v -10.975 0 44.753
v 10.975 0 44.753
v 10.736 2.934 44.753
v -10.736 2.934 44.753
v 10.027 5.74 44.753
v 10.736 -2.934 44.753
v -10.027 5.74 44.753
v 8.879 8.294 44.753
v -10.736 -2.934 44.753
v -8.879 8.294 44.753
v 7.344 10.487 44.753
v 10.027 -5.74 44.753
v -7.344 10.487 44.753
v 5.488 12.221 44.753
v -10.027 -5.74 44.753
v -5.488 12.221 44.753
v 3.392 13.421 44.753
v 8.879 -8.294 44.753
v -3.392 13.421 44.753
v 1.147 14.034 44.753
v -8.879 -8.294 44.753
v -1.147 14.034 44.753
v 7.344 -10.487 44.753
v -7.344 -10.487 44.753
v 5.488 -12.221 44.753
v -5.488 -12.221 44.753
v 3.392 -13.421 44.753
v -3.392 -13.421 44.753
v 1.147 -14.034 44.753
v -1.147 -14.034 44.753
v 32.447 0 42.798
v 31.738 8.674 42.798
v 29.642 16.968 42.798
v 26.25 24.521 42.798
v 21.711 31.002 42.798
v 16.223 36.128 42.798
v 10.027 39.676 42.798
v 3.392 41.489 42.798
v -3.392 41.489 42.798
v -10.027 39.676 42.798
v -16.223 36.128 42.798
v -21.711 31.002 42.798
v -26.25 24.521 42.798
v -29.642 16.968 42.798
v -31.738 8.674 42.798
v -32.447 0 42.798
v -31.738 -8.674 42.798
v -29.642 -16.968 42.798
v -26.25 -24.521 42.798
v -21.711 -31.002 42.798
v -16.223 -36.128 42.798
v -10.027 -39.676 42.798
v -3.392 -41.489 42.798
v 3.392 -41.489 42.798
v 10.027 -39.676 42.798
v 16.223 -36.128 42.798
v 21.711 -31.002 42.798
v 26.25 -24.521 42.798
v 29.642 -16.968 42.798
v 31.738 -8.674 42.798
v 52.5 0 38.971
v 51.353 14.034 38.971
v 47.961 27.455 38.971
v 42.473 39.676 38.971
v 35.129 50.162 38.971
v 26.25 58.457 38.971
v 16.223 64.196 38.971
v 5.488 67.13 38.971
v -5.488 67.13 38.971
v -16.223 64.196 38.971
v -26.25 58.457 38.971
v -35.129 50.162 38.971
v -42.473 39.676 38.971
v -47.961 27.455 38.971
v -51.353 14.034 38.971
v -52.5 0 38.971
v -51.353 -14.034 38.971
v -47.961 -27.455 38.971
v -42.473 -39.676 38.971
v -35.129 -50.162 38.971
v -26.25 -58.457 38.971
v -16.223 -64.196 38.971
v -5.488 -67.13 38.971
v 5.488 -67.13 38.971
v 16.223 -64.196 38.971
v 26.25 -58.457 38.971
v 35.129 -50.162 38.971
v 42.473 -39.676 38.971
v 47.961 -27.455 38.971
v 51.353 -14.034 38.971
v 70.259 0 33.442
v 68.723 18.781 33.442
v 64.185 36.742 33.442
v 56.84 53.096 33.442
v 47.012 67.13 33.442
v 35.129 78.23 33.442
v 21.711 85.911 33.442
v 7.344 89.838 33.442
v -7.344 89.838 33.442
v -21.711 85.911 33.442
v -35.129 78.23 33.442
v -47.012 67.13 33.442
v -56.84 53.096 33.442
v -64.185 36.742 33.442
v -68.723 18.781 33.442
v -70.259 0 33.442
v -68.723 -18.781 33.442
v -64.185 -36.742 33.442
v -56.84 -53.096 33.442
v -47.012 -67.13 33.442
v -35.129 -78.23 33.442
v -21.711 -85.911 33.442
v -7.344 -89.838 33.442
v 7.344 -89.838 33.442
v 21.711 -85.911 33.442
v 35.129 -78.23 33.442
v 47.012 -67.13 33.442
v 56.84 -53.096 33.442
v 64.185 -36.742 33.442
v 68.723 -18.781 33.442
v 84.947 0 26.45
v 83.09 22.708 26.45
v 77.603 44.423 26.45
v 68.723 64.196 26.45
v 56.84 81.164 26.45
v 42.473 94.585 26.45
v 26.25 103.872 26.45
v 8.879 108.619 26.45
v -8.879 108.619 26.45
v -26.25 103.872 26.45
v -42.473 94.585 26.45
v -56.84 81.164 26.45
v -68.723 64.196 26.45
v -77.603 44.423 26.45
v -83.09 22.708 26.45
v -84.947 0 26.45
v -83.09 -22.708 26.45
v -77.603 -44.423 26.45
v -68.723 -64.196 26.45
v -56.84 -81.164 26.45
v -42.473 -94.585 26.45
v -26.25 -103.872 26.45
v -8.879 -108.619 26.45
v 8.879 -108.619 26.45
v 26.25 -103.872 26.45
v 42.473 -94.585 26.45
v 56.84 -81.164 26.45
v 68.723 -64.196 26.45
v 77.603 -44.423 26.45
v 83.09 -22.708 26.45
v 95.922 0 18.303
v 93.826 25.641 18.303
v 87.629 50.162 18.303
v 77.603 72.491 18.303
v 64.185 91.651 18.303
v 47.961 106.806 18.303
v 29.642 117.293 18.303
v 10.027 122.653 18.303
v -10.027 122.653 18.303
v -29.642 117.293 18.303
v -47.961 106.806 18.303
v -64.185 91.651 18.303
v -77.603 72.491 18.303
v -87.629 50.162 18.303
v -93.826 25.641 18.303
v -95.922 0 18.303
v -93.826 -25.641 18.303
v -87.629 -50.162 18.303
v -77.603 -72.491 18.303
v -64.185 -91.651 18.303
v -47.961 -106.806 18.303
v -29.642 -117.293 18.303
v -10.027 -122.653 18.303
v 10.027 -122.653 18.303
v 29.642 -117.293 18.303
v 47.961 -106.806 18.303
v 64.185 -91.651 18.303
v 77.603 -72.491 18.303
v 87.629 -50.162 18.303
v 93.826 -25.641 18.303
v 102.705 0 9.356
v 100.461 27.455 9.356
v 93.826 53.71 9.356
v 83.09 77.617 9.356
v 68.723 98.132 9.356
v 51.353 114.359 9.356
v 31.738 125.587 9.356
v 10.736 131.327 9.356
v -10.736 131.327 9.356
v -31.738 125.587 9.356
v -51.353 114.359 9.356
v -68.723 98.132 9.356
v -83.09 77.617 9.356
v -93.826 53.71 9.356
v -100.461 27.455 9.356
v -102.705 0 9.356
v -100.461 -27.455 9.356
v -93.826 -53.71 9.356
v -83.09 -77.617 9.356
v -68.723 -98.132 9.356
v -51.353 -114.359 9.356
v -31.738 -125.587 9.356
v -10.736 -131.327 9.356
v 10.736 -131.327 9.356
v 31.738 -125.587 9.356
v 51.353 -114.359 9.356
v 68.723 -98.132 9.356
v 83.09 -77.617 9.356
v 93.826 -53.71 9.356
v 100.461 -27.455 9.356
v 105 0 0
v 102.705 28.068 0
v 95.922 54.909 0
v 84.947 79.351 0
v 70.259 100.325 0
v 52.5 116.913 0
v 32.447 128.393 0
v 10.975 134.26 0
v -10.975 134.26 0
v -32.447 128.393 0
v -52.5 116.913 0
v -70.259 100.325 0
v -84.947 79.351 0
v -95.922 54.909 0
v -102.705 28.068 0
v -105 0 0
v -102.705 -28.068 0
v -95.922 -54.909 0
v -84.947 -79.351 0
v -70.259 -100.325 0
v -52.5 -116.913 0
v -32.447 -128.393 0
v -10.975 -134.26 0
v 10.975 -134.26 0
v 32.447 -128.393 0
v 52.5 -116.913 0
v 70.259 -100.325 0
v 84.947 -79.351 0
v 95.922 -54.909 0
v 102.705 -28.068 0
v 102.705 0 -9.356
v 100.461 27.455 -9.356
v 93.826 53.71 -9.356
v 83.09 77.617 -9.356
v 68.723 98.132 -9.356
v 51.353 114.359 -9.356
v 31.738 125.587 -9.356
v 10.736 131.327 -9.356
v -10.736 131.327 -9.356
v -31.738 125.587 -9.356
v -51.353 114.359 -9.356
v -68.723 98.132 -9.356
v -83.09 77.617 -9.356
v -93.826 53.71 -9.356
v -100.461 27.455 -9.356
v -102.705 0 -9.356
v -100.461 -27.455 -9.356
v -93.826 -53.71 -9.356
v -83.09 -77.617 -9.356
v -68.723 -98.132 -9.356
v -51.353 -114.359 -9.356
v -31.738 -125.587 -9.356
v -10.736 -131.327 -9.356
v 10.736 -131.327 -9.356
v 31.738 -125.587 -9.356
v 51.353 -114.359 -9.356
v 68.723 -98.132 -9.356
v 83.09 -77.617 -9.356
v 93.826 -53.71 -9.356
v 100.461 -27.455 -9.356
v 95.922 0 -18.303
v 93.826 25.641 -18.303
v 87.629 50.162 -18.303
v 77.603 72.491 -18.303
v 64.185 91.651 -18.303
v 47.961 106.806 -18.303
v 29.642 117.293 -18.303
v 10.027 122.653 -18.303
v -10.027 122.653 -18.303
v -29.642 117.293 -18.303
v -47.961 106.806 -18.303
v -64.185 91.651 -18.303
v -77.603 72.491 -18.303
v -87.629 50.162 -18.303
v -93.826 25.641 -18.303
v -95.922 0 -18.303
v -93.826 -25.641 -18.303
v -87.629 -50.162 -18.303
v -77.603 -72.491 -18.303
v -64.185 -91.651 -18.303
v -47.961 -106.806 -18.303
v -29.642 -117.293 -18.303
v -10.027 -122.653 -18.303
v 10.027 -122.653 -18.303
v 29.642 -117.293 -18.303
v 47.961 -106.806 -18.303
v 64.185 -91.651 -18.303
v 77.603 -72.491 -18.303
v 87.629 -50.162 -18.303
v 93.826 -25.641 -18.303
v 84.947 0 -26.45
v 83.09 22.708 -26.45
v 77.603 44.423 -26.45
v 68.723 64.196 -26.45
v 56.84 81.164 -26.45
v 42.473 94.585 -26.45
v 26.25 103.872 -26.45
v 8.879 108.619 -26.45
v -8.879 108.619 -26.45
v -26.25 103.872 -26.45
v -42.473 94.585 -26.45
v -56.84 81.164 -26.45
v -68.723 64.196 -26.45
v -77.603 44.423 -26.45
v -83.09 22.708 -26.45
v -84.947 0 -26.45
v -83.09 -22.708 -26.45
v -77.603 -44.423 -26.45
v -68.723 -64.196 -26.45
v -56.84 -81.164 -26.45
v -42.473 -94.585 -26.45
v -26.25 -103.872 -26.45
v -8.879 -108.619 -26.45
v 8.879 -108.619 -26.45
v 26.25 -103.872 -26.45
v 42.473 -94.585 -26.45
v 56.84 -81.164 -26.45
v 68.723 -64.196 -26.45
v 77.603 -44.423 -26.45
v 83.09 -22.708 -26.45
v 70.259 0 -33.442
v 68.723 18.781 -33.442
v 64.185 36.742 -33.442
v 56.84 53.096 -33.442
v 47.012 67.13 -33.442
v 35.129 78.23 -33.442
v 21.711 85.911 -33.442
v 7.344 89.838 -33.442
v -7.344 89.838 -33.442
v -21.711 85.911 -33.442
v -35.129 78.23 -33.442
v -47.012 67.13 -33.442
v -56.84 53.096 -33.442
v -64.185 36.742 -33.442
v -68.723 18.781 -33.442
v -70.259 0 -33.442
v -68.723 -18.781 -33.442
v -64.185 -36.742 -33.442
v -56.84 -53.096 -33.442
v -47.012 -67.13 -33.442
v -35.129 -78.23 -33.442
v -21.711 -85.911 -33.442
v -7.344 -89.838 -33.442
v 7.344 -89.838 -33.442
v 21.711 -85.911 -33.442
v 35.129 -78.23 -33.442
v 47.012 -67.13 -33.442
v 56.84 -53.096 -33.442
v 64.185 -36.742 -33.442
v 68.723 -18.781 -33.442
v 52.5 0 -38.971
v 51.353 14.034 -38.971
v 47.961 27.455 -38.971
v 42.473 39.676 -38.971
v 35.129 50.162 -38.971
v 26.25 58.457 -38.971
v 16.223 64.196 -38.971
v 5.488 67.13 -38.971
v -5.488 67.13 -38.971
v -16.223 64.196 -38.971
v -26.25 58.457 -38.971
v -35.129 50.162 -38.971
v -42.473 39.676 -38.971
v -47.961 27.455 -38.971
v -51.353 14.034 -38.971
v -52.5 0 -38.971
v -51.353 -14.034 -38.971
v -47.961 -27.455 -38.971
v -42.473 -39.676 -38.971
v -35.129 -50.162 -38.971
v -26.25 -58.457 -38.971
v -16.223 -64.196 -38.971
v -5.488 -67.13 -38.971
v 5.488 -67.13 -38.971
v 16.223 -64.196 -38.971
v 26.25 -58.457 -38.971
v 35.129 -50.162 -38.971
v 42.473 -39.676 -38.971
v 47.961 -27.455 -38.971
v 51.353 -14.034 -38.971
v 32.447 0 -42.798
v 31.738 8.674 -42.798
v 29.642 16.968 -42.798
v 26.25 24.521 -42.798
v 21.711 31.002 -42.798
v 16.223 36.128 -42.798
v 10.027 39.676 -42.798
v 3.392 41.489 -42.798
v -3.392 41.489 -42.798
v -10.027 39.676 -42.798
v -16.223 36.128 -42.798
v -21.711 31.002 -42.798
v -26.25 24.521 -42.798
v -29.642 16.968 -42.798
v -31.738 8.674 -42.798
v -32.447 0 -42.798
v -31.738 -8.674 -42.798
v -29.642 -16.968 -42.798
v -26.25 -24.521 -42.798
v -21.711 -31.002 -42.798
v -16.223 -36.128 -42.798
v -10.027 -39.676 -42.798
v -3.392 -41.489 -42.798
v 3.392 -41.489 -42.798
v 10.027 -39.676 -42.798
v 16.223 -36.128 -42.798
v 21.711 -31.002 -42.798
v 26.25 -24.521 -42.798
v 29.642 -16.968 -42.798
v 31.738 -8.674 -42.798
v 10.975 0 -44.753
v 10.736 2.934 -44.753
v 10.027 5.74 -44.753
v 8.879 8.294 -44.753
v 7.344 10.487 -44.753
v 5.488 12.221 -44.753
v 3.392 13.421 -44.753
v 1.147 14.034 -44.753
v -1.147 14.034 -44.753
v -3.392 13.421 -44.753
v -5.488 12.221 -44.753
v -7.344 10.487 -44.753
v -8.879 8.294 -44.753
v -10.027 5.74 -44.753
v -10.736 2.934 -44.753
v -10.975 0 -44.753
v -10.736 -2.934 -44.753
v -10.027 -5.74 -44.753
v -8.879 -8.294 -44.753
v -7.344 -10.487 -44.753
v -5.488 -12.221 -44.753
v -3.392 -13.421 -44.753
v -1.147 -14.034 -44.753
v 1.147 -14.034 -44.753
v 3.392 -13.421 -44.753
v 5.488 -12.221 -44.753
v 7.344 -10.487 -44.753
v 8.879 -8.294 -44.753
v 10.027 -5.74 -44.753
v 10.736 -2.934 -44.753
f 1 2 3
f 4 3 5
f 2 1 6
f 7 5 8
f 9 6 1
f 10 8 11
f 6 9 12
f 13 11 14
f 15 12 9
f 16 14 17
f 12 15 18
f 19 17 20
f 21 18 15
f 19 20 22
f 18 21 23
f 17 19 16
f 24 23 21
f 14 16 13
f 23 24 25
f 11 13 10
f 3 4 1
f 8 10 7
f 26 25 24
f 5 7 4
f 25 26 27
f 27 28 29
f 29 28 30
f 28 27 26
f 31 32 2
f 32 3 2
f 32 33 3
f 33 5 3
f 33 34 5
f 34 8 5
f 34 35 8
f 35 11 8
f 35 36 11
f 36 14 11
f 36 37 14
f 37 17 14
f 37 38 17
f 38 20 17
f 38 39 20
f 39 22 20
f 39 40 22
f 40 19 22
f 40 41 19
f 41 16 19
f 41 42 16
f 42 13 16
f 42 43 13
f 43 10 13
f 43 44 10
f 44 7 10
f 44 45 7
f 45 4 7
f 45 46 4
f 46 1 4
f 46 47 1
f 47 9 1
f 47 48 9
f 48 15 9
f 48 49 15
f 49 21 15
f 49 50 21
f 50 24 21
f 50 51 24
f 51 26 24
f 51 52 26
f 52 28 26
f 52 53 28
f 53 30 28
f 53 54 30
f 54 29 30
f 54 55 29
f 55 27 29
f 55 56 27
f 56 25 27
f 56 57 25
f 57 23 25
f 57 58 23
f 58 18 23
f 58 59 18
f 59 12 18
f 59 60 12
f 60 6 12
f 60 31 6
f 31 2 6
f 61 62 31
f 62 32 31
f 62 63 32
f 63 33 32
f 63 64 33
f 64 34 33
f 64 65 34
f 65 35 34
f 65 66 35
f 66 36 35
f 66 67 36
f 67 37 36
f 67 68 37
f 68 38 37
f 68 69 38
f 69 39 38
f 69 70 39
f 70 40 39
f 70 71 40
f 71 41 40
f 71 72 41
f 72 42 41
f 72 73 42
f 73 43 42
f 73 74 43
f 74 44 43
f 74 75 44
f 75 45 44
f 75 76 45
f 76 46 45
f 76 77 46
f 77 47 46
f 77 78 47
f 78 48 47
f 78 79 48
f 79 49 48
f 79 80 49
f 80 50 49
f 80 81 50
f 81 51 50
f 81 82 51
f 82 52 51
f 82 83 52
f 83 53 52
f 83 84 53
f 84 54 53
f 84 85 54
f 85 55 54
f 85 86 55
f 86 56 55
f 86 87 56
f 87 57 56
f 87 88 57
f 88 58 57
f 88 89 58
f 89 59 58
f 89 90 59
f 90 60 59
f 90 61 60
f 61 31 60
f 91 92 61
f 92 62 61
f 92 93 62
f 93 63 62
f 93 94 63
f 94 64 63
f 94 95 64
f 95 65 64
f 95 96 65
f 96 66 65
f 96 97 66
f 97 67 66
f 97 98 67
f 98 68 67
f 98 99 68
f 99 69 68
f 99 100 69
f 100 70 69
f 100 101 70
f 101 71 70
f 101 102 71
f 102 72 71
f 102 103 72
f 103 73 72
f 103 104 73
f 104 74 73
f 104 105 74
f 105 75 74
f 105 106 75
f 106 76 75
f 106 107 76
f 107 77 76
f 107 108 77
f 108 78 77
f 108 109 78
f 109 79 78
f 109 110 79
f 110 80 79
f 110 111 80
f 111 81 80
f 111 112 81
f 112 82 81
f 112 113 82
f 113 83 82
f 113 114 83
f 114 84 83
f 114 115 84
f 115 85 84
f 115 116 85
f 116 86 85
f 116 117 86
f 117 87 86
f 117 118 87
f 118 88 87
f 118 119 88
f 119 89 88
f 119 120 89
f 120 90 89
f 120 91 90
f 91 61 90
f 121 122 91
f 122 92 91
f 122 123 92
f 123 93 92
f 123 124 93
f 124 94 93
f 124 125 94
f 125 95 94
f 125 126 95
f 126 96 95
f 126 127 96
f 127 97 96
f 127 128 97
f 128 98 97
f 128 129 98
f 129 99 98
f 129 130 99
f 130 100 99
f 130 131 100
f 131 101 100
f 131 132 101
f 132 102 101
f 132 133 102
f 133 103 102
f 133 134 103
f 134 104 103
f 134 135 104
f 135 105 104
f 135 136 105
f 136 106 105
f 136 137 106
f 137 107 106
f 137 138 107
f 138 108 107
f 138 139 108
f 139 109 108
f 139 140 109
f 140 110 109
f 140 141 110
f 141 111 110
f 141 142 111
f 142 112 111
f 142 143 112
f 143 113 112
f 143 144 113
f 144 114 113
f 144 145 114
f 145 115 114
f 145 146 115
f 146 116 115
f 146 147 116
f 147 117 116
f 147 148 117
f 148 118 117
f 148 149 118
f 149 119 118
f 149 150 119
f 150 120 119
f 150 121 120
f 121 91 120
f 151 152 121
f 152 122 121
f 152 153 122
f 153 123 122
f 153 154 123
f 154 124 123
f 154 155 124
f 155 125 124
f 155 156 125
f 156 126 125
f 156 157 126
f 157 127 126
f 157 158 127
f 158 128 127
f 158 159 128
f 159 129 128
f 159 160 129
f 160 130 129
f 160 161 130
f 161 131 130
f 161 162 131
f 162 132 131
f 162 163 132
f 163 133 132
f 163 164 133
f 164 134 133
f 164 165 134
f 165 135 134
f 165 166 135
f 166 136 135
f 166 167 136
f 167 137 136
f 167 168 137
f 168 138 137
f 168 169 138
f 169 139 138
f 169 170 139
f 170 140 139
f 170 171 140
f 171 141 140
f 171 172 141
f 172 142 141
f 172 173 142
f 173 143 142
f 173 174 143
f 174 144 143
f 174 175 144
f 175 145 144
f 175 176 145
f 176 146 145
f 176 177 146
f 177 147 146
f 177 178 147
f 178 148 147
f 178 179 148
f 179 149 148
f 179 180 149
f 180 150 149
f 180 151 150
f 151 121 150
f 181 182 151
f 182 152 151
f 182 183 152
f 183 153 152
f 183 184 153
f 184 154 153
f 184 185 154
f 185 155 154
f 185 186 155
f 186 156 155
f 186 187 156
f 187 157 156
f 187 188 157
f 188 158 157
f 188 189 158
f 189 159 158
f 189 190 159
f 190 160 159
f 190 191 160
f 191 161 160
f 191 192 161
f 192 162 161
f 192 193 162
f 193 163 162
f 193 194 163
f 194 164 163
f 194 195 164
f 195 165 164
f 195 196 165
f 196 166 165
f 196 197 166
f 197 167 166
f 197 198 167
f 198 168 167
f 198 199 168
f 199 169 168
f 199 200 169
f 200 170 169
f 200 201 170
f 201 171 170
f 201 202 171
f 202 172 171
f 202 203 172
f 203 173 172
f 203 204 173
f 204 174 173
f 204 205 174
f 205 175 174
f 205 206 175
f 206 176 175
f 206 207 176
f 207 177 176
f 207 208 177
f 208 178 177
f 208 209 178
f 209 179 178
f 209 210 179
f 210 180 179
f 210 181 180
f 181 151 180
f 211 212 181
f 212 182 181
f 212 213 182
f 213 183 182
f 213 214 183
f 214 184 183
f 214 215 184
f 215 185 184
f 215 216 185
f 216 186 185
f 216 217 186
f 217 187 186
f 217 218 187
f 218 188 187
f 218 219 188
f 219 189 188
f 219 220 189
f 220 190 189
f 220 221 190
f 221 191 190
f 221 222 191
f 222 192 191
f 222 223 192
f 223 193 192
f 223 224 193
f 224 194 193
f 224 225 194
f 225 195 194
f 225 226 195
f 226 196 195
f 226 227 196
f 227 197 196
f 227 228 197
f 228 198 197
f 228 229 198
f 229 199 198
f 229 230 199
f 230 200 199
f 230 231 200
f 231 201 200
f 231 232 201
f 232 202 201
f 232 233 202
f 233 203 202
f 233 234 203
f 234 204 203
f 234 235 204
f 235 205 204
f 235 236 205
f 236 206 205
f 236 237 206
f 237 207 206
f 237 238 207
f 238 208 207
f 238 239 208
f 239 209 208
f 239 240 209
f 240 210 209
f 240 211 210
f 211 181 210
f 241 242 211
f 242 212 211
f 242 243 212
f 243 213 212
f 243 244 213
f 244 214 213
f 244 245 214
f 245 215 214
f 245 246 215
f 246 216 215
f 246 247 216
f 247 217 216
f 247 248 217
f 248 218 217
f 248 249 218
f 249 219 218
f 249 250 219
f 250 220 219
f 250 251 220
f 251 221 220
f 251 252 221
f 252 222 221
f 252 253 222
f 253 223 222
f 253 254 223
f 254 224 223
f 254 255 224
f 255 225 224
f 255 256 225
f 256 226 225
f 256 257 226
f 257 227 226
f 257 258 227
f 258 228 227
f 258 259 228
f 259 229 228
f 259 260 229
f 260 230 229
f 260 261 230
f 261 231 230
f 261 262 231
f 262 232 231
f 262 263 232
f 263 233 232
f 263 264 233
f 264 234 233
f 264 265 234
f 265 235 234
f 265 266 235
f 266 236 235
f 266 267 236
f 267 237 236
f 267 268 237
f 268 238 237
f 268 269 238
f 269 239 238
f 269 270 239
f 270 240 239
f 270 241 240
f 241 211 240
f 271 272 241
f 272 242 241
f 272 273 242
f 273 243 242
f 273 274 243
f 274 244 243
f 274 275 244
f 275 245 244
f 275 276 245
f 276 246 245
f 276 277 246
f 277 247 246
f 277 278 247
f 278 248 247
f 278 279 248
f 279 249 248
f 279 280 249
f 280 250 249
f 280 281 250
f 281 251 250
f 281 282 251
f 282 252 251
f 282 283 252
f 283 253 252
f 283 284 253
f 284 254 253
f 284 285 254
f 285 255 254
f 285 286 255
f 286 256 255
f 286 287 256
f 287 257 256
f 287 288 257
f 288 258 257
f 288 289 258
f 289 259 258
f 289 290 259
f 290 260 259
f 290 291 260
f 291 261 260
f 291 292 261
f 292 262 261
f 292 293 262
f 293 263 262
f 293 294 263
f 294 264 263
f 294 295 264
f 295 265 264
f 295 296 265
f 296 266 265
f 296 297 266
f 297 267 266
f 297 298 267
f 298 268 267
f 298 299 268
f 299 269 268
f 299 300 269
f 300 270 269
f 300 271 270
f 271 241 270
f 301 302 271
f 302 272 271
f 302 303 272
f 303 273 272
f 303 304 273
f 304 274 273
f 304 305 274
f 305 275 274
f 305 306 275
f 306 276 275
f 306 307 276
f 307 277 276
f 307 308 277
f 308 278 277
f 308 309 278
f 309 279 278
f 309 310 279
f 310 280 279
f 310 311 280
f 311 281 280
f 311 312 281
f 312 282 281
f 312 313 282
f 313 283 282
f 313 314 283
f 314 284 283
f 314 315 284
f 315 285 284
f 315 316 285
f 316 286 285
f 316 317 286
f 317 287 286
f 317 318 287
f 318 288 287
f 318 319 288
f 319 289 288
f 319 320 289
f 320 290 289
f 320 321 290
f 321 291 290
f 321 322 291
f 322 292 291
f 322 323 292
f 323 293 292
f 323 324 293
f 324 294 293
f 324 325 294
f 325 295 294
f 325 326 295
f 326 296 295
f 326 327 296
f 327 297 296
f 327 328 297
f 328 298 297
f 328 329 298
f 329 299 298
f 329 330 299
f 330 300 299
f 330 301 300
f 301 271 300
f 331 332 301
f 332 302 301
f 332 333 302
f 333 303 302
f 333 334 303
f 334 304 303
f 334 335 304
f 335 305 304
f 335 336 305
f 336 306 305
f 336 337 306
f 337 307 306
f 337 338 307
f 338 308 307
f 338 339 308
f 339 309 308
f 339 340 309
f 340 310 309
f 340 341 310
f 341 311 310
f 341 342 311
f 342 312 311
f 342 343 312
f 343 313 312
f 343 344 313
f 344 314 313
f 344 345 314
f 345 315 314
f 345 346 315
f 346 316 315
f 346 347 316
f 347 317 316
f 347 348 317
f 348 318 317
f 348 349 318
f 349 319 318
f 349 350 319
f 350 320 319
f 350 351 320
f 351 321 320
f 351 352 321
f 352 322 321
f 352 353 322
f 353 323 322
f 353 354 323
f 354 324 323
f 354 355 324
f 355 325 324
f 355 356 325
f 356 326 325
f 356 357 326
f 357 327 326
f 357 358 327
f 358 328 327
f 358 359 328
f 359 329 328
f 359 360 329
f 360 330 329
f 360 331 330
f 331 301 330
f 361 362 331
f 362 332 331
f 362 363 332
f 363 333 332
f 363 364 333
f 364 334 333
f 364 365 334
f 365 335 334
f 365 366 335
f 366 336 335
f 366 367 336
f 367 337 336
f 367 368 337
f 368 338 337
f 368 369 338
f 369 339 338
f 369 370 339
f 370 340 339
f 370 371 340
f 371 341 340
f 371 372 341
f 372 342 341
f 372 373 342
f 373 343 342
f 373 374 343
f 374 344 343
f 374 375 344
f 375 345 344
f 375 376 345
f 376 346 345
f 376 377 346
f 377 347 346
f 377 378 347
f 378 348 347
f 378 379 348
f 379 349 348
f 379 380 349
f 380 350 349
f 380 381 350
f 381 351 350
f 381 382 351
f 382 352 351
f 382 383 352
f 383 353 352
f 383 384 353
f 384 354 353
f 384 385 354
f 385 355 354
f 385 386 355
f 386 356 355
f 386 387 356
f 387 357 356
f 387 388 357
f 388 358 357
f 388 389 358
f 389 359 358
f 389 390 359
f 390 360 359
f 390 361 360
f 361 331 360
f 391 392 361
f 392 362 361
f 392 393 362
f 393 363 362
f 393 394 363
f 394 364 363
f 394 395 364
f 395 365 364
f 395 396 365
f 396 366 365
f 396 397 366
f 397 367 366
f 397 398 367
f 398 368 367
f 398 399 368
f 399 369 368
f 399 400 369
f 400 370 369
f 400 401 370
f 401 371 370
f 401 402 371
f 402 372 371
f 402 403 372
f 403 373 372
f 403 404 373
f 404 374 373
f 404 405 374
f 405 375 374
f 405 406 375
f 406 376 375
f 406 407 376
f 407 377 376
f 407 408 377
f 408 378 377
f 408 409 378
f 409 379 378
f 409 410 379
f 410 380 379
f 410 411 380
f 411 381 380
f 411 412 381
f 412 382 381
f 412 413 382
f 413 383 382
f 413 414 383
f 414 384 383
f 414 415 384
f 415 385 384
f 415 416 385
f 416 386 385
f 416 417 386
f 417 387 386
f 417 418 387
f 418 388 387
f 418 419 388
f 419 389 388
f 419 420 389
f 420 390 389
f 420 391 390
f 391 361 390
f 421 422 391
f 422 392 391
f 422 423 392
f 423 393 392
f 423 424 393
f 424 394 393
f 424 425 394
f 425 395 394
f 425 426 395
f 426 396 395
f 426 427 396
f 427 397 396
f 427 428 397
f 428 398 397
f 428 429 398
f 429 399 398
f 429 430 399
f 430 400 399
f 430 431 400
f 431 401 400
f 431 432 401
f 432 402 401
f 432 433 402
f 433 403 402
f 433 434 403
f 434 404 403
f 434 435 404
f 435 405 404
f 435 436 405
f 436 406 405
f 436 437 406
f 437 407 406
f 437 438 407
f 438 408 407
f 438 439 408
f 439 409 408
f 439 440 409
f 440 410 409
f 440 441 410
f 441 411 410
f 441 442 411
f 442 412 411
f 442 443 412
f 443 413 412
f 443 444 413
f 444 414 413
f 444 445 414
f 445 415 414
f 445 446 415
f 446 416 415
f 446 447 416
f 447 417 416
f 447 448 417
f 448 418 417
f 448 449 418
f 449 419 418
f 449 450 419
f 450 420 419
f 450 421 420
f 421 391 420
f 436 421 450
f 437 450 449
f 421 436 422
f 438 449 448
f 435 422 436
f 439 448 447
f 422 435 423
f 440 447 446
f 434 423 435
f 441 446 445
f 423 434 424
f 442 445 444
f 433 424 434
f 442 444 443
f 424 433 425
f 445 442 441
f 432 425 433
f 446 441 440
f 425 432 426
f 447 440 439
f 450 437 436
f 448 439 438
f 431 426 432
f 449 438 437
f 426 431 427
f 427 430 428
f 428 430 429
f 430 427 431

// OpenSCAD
// Generated by SolidPython 1.0.1 on 2020-07-29 00:46:47


scale(v = [7, 9, 3]) {
	sphere(r = 15);
}
/***********************************************
*********      SolidPython code:      **********
************************************************
 
# import packages: SolidPython
from solid import *
from solid.utils import *
from itertools import chain, combinations, permutations


class Resize:

    def __init__(self, scad_file):
        self.scad_file = scad_file
        #self.scad_file = import_scad(scad_file)
        # cone/cylinder param:
        self.r1 = 0
        self.r2 = 0
        self.h = 0
        # rectangular prism param:
        self.w = 0
        self.l = 0
        # ellipse param:
        self.r = 0

    # import OpenScad code (file name corresponds to shape)


    # classify shape + parameters
    def assign(self, param1, param2, param3):
        if self.scad_file == 'cone.scad':
            self.r1 = param1
            self.r2 = param2
            self.h = param3
        elif self.scad_file == 'cylinder.scad':
            self.r1 = param1
            self.r2 = param2
            self.h = param3
        elif self.scad_file == 'rectangularPrism.scad':
            self.h = param1
            self.l = param2
            self.w = param3
        else:
            self.r = param1
            self.h = param2

    # resize parameters
    def iterate(self):
        x = range(3, 20, 2)
        i = 1
        if self.scad_file == 'cone.scad':
            tempList = list(permutations(x, 2))
            for temp in tempList:
                param1 = temp[0]
                param2 = temp[1]
                filepath = 'produced_scad_files/' + 'cone' + str(param1) + '_' + str(param2) + '_' + '.scad'
                scad_render_to_file(cylinder(h=param1, r1=param2, r2=0), filepath)

        elif self.scad_file == 'cylinder.scad':
            tempList = list(permutations(x, 3))
            for temp in tempList:
                param1 = temp[0]
                param2 = temp[1]
                filepath = 'produced_scad_files/' + 'cylinder' + str(param1) + '_' + str(param2) + '_' + '.scad'
                scad_render_to_file(cylinder(h=param1, r1=param2, r2=param2), filepath)

        elif self.scad_file == 'rectangularPrism.scad':
            tempList = list(permutations(x, 3))
            for temp in tempList:
                param1 = temp[0]
                param2 = temp[1]
                param3 = temp[2]
                filepath = 'produced_scad_files/' + 'rectangularPrism' + str(param1) + '_' + str(param2) + '_' + str(
                    param3) + '.scad'
                scad_render_to_file(cube(size=(param1, param2, param3)), filepath)

        elif self.scad_file == 'ellipse.scad':
            tempList = list(permutations(x, 4))
            for temp in tempList:
                param1 = temp[0]
                param2 = temp[1]
                param3 = temp[2]
                param4 = temp[3]
                filepath = 'produced_scad_files/' + 'ellipse' + str(param1) + '_' + str(param2) + '_' + str(param3) + '_' + str(param4) + '.scad'
                scad_render_to_file(scale([param1, param2, param3])(sphere(r=param4)), filepath)

    def render_to_scadfile(self):
        scad_render_to_file(scad, 'example.scad') 
 
************************************************/
